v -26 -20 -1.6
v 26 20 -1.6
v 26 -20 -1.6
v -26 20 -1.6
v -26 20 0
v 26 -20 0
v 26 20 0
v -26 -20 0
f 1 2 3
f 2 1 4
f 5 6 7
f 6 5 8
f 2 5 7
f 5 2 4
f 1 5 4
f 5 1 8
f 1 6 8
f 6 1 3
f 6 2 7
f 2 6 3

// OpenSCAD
// file: ../p/box.scad
use <../lib.scad>
function ldraw_lib__box() = [
// 0 Box 6 (six faces)
// 0 Name: box.dat
// 0 Author: James Jessiman
// 0 !LDRAW_ORG Primitive UPDATE 2002-05
// 0 !LICENSE Licensed under CC BY 4.0 : see CAreadme.txt
// 
// 0 BFC CERTIFY CCW
  [0,"BFC","CERTIFY"],
  [0,"BFC","CCW"],
// 
// 0 !HISTORY 2002-08-22 [sbliss] Applied BFC
// 0 !HISTORY 2002-11-30 [PTadmin] Official Update 2002-05
// 0 !HISTORY 2007-06-24 [PTadmin] Header formatted for Contributor Agreement
// 0 !HISTORY 2008-07-01 [PTadmin] Official Update 2008-01
// 
// 
// 2 24 1 1 1 -1 1 1
  [2,24,1,1,1,-1,1,1],
// 2 24 -1 1 1 -1 1 -1
  [2,24,-1,1,1,-1,1,-1],
// 2 24 -1 1 -1 1 1 -1
  [2,24,-1,1,-1,1,1,-1],
// 2 24 1 1 -1 1 1 1
  [2,24,1,1,-1,1,1,1],
// 2 24 1 -1 1 -1 -1 1
  [2,24,1,-1,1,-1,-1,1],
// 2 24 -1 -1 1 -1 -1 -1
  [2,24,-1,-1,1,-1,-1,-1],
// 2 24 -1 -1 -1 1 -1 -1
  [2,24,-1,-1,-1,1,-1,-1],
// 2 24 1 -1 -1 1 -1 1
  [2,24,1,-1,-1,1,-1,1],
// 2 24 1 -1 1 1 1 1
  [2,24,1,-1,1,1,1,1],
// 2 24 -1 -1 1 -1 1 1
  [2,24,-1,-1,1,-1,1,1],
// 2 24 1 -1 -1 1 1 -1
  [2,24,1,-1,-1,1,1,-1],
// 2 24 -1 -1 -1 -1 1 -1
  [2,24,-1,-1,-1,-1,1,-1],
// 4 16 1 1 1 1 1 -1 -1 1 -1 -1 1 1
  [4,16,1,1,1,1,1,-1,-1,1,-1,-1,1,1],
// 4 16 -1 -1 -1 1 -1 -1 1 -1 1 -1 -1 1
  [4,16,-1,-1,-1,1,-1,-1,1,-1,1,-1,-1,1],
// 4 16 -1 -1 1 1 -1 1 1 1 1 -1 1 1
  [4,16,-1,-1,1,1,-1,1,1,1,1,-1,1,1],
// 4 16 -1 -1 -1 -1 -1 1 -1 1 1 -1 1 -1
  [4,16,-1,-1,-1,-1,-1,1,-1,1,1,-1,1,-1],
// 4 16 1 -1 -1 -1 -1 -1 -1 1 -1 1 1 -1
  [4,16,1,-1,-1,-1,-1,-1,-1,1,-1,1,1,-1],
// 4 16 1 -1 1 1 -1 -1 1 1 -1 1 1 1
  [4,16,1,-1,1,1,-1,-1,1,1,-1,1,1,1],
// 0
];
module ldraw_lib__box(step=0, col=false, unit=2/5, alt=false, line=0.2, solid=!$preview)
    makepoly(ldraw_lib__box(), step=step, col=col, unit=unit, alt=alt, line=line, solid=solid);
ldraw_lib__box(line=0.2);
// main file
use <../lib.scad>
use <../p/box.scad>
function ldraw_lib__11036() = [
// 0 ~Electric Mindstorms EV3 LCD Screen
// 0 Name: 11036.dat
// 0 Author: Philippe Hurbain [Philo]
// 0 !LDRAW_ORG Part UPDATE 2013-02
// 0 !LICENSE Licensed under CC BY 4.0 : see CAreadme.txt
// 
// 0 BFC CERTIFY CCW
  [0,"BFC","CERTIFY"],
  [0,"BFC","CCW"],
// 
// 0 !HISTORY 2012-05-20 {LEGO MINDSTORMS Team} Original part shape
// 0 !HISTORY 2012-12-09 [Philo] Complete rebuild for LDraw Parts Tracker
// 0 !HISTORY 2013-12-23 [PTadmin] Official Update 2013-02
// 
// 
// 0 // Shape is highly simplified.
// 
// 1 16 0 2 0 65 0 0 0 2 0 0 0 50 box.dat
  [1,16,0,2,0,65,0,0,0,2,0,0,0,50, ldraw_lib__box()],
// 
];
module ldraw_lib__11036(step=0, col=false, unit=2/5, alt=false, line=0.2, solid=!$preview)
    makepoly(ldraw_lib__11036(), step=step, col=col, unit=unit, alt=alt, line=line, solid=solid);
ldraw_lib__11036(line=0.2);
